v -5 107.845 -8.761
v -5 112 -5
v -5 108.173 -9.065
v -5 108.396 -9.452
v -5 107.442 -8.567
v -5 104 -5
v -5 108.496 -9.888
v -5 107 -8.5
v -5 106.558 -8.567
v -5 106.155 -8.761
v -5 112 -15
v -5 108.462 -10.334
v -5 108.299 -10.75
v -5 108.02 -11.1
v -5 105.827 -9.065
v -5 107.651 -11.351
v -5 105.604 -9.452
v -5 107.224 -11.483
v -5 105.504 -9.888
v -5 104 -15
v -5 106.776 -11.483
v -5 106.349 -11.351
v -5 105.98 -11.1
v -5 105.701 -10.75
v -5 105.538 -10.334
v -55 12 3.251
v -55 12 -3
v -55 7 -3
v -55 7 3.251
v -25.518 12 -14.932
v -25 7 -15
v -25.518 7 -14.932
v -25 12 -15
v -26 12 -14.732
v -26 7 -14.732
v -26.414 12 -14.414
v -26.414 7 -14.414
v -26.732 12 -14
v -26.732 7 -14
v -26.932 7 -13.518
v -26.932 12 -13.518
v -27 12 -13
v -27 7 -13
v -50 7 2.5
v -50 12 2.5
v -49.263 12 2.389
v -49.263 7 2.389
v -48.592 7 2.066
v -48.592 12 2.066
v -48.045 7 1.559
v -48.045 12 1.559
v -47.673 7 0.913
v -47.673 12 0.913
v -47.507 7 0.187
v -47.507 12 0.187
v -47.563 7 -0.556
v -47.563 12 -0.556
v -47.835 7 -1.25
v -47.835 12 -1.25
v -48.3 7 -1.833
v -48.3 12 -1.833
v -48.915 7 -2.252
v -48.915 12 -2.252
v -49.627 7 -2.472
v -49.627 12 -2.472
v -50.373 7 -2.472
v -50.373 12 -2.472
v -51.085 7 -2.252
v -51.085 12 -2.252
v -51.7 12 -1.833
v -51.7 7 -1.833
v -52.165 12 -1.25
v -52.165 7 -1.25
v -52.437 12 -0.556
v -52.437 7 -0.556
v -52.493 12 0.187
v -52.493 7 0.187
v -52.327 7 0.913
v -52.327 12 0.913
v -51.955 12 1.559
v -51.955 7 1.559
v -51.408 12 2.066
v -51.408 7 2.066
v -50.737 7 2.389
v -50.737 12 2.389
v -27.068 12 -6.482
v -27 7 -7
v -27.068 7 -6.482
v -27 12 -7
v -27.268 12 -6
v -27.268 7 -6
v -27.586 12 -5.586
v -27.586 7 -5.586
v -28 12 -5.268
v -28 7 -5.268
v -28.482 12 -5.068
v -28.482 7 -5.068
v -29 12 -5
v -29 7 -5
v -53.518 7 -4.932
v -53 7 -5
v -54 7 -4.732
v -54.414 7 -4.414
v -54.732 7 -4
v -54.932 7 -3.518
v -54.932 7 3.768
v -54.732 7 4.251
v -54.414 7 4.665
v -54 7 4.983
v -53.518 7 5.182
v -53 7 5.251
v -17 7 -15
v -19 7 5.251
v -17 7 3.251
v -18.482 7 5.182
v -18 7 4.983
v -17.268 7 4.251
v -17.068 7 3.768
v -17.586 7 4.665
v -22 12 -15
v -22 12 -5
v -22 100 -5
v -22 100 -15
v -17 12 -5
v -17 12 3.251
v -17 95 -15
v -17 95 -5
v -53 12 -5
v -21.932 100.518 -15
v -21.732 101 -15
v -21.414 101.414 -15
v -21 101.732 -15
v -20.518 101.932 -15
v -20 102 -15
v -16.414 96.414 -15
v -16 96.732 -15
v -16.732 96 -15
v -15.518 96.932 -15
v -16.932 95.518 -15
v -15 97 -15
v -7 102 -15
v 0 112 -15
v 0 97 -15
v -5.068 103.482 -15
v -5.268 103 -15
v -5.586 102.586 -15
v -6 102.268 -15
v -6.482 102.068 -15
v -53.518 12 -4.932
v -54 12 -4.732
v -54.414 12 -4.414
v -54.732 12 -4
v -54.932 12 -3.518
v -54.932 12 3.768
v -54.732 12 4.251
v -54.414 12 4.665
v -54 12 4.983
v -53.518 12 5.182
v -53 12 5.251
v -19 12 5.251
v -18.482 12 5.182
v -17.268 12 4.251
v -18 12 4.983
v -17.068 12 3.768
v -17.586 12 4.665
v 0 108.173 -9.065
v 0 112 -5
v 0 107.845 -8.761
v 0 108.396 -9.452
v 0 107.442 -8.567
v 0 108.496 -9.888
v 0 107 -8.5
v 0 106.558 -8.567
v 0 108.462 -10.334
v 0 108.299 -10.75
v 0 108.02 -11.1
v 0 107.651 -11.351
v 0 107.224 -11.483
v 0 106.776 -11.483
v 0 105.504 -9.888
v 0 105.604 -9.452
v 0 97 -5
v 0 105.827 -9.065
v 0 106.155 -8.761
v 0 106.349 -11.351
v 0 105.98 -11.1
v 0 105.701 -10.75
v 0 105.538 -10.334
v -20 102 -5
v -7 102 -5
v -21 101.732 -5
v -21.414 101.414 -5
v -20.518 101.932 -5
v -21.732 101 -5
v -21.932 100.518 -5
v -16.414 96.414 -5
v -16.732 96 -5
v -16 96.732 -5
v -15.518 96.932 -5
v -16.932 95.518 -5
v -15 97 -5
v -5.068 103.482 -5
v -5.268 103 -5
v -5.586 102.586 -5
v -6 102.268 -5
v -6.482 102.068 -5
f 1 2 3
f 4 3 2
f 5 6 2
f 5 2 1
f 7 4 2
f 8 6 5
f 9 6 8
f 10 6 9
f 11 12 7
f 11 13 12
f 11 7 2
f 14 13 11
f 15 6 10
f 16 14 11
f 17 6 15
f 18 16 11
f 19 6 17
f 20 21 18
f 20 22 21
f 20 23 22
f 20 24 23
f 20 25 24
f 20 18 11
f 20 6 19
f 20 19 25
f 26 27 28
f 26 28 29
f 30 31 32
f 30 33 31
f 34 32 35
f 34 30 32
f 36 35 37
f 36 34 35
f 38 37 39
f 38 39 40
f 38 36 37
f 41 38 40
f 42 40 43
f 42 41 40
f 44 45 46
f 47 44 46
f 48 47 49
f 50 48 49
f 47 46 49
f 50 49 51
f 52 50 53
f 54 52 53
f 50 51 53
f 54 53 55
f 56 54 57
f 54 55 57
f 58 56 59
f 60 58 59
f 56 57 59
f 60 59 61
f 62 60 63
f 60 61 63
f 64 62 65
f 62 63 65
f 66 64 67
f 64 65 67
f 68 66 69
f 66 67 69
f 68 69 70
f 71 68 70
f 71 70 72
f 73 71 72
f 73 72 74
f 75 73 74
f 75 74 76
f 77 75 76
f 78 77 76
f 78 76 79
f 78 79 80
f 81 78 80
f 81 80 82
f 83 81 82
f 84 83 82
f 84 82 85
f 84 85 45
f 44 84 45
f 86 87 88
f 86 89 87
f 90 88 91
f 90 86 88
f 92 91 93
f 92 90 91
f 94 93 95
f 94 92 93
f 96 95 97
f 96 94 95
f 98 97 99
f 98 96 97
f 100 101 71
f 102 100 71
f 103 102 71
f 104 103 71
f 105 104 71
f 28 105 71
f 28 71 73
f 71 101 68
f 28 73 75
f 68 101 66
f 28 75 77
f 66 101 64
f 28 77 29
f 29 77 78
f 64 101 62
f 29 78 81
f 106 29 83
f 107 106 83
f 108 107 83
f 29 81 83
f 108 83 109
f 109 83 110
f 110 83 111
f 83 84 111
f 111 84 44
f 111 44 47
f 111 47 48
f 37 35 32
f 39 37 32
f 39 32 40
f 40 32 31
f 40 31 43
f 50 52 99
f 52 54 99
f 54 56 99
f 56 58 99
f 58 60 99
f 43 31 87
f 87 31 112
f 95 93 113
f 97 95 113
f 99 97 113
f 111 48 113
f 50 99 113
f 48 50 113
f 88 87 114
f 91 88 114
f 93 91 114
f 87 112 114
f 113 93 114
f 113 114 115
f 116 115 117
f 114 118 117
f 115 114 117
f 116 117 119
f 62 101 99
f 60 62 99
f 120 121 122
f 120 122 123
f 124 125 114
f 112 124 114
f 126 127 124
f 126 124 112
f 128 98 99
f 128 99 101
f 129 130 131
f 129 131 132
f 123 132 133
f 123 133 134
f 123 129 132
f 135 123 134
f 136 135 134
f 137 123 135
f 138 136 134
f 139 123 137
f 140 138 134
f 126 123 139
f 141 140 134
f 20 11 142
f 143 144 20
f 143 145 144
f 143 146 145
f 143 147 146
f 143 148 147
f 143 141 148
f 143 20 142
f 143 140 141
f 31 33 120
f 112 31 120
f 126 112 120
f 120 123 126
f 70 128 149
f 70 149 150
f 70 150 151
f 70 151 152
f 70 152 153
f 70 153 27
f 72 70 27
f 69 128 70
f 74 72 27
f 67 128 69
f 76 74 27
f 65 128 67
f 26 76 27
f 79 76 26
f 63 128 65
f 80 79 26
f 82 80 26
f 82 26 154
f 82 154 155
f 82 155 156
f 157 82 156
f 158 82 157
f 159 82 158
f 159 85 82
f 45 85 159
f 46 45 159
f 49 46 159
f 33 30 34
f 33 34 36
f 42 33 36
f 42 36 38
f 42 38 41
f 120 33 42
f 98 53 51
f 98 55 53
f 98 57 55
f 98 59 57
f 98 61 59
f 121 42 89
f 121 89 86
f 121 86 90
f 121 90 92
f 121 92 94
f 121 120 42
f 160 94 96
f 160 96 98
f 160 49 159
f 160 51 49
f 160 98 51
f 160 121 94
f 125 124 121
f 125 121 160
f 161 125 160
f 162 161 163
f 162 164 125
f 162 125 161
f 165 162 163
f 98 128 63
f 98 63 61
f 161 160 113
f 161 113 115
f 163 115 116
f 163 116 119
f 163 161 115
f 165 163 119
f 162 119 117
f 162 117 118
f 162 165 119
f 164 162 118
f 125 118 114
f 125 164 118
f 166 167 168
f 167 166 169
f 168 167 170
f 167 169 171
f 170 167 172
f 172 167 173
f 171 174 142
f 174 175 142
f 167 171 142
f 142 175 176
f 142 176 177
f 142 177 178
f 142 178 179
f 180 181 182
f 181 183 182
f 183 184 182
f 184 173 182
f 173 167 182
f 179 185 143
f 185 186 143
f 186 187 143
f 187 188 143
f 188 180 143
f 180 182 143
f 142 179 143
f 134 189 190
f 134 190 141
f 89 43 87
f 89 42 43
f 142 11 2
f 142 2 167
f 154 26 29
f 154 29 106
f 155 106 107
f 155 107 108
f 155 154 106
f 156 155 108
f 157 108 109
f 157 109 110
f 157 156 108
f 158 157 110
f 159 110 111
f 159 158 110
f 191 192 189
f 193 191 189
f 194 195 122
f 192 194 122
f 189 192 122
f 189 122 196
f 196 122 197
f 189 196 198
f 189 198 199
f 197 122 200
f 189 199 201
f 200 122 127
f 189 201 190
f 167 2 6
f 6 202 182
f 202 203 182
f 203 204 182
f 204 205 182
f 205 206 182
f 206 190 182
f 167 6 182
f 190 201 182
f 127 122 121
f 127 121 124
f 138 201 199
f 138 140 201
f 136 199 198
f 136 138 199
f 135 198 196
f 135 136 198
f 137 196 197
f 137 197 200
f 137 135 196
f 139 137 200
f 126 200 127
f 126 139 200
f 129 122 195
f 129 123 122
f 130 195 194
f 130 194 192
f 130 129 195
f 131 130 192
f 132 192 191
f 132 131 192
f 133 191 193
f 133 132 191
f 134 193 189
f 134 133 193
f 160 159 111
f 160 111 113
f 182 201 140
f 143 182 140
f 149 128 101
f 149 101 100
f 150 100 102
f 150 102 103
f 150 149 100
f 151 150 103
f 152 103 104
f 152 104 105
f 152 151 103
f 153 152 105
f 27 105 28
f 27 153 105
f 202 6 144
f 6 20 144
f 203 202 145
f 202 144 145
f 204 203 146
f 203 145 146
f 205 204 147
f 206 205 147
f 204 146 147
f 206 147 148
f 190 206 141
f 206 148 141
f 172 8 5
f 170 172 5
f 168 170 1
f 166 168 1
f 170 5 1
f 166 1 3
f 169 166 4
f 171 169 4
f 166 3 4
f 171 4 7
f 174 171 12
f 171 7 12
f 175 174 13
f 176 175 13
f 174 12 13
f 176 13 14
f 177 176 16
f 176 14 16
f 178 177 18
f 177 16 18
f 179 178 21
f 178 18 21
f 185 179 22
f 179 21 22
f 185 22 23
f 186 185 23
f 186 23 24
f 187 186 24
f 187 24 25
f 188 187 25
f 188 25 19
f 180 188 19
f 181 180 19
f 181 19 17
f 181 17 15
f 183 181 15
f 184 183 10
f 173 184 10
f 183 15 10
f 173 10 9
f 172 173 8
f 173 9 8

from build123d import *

# Parameters (mm, degrees)
BOSS_EXTRUDE1_DEPTH    = 7
SKETCH2_W              = 5
SKETCH2_H              = 10
BOSS_EXTRUDE2_DEPTH    = 95
SKETCH15_R             = 3.5
CUT_EXTRUDE3_DEPTH     = 7
CIRPATTERN1_COUNT      = 8
SKETCH18_W             = 10
SKETCH18_H             = 5
BOSS_EXTRUDE3_DEPTH    = 34
BOSS_EXTRUDE4_DEPTH    = 10
FILLET1_R              = 2
FILLET2_R              = 2
LPATTERN2_COUNT        = 10
LPATTERN2_PITCH        = 8
FILLET1_OF_LPATTERN2_R = 2
SKETCH20_R             = 2.5
CUT_EXTRUDE4_DEPTH     = 10
CIRPATTERN2_COUNT      = 4
SKETCH21_W             = 135.948856065
SKETCH21_H             = 109.776083996
CUT_EXTRUDE5_DEPTH     = 61.740758688
BOSS_EXTRUDE5_START    = 5
SKETCH22_R             = 2.5
BOSS_EXTRUDE5_DEPTH    = 5
CUT_EXTRUDE6_START     = -10
CUT_EXTRUDE6_DEPTH     = 10
SKETCH24_W             = 6
SKETCH24_H             = 7
CUT_EXTRUDE7_DEPTH     = 1
SKETCH25_W             = 6
SKETCH25_H             = 7
CUT_EXTRUDE8_DEPTH     = 1
SKETCH26_W             = 10
SKETCH26_H             = 5
BOSS_EXTRUDE6_DEPTH    = 5
SKETCH27_W             = 5
SKETCH27_H             = 10
BOSS_EXTRUDE7_DEPTH    = 10
SKETCH29_R             = 1.5
CUT_EXTRUDE9_DEPTH     = 5
FILLET3_R              = 2


with BuildPart() as part:
    # Sketch1 → Boss-Extrude1 (new body)
    with BuildSketch(Plane(origin=(0, 0, 0), x_dir=(1, 0, 0), z_dir=(0, 1, 0))):
        with BuildLine():
            Line((-8, 56.940758688), (-8, 59.740758688))
            ThreePointArc((-8, 59.740758688), (-7.414213562, 61.154972251), (-6, 61.740758688))
            Line((-6, 61.740758688), (6, 61.740758688))
            ThreePointArc((6, 61.740758688), (7.414213562, 61.154972251), (8, 59.740758688))
            Line((8, 59.740758688), (8, 56.940758688))
            ThreePointArc((8, 56.940758688), (22.004297361, 53.123073119), (34.606342345, 45.920050844))
            Line((34.606342345, 45.920050844), (36.586241332, 47.899949831))
            ThreePointArc((36.586241332, 47.899949831), (38.000454895, 48.485736269), (39.414668457, 47.899949831))
            Line((39.414668457, 47.899949831), (47.899949831, 39.414668457))
            ThreePointArc((47.899949831, 39.414668457), (48.485736269, 38.000454895), (47.899949831, 36.586241332))
            Line((47.899949831, 36.586241332), (45.920050844, 34.606342345))
            ThreePointArc((45.920050844, 34.606342345), (53.123073119, 22.004297361), (56.940758688, 8))
            Line((56.940758688, 8), (59.740758688, 8))
            ThreePointArc((59.740758688, 8), (61.154972251, 7.414213562), (61.740758688, 6))
            Line((61.740758688, 6), (61.740758688, -6))
            ThreePointArc((61.740758688, -6), (61.154972251, -7.414213562), (59.740758688, -8))
            Line((59.740758688, -8), (56.940758688, -8))
            ThreePointArc((56.940758688, -8), (53.123073119, -22.004297361), (45.920050844, -34.606342345))
            Line((45.920050844, -34.606342345), (47.899949831, -36.586241332))
            ThreePointArc((47.899949831, -36.586241332), (48.485736269, -38.000454895), (47.899949831, -39.414668457))
            Line((47.899949831, -39.414668457), (39.414668457, -47.899949831))
            ThreePointArc((39.414668457, -47.899949831), (38.000454895, -48.485736269), (36.586241332, -47.899949831))
            Line((36.586241332, -47.899949831), (34.606342345, -45.920050844))
            ThreePointArc((34.606342345, -45.920050844), (22.004297361, -53.123073119), (8, -56.940758688))
            Line((8, -56.940758688), (8, -59.740758688))
            ThreePointArc((8, -59.740758688), (7.414213562, -61.154972251), (6, -61.740758688))
            Line((6, -61.740758688), (-6, -61.740758688))
            ThreePointArc((-6, -61.740758688), (-7.414213562, -61.154972251), (-8, -59.740758688))
            Line((-8, -59.740758688), (-8, -56.940758688))
            ThreePointArc((-8, -56.940758688), (-22.004297361, -53.123073119), (-34.606342345, -45.920050844))
            Line((-34.606342345, -45.920050844), (-36.586241332, -47.899949831))
            ThreePointArc((-36.586241332, -47.899949831), (-38.000454895, -48.485736269), (-39.414668457, -47.899949831))
            Line((-39.414668457, -47.899949831), (-47.899949831, -39.414668457))
            ThreePointArc((-47.899949831, -39.414668457), (-48.485736269, -38.000454895), (-47.899949831, -36.586241332))
            Line((-47.899949831, -36.586241332), (-45.920050844, -34.606342345))
            ThreePointArc((-45.920050844, -34.606342345), (-53.123073119, -22.004297361), (-56.940758688, -8))
            Line((-56.940758688, -8), (-59.740758688, -8))
            ThreePointArc((-59.740758688, -8), (-61.154972251, -7.414213562), (-61.740758688, -6))
            Line((-61.740758688, -6), (-61.740758688, 6))
            ThreePointArc((-61.740758688, 6), (-61.154972251, 7.414213562), (-59.740758688, 8))
            Line((-59.740758688, 8), (-56.940758688, 8))
            ThreePointArc((-56.940758688, 8), (-53.123073119, 22.004297361), (-45.920050844, 34.606342345))
            Line((-45.920050844, 34.606342345), (-47.899949831, 36.586241332))
            ThreePointArc((-47.899949831, 36.586241332), (-48.485736269, 38.000454895), (-47.899949831, 39.414668457))
            Line((-47.899949831, 39.414668457), (-39.414668457, 47.899949831))
            ThreePointArc((-39.414668457, 47.899949831), (-38.000454895, 48.485736269), (-36.586241332, 47.899949831))
            Line((-36.586241332, 47.899949831), (-34.606342345, 45.920050844))
            ThreePointArc((-34.606342345, 45.920050844), (-22.004297361, 53.123073119), (-8, 56.940758688))
        make_face()
    extrude(amount=BOSS_EXTRUDE1_DEPTH)

    # Sketch2 → Boss-Extrude2 (add)
    with BuildSketch(Plane(origin=(0, 7, 0), x_dir=(1, 0, 0), z_dir=(0, 1, 0))):
        with Locations((19.5, 10)):
            Rectangle(SKETCH2_W, SKETCH2_H)
        with Locations((-19.5, 10)):
            Rectangle(SKETCH2_W, SKETCH2_H)
    extrude(amount=BOSS_EXTRUDE2_DEPTH)

    # Sketch15 → Cut-Extrude3 (cut)
    with BuildSketch(Plane.XZ):
        with Locations(Location((0, 0, 0), (0, 0, 270))):
            Circle(SKETCH15_R)
    extrude(amount=-CUT_EXTRUDE3_DEPTH, mode=Mode.SUBTRACT)

    # Sketch16 → Cut-Loft2 section 0
    with BuildSketch(Plane.XZ):
        with BuildLine():
            Line((-6, 59.8), (6, 59.8))
            Line((6, 59.8), (6, 57.5))
            Line((6, 57.5), (-6, 57.5))
            Line((-6, 57.5), (-6, 59.8))
        make_face()
    # Sketch17 → Cut-Loft2 section 1
    with BuildSketch(Plane(origin=(0, 7, 0), x_dir=(1, 0, 0), z_dir=(0, 1, 0))):
        with BuildLine():
            Line((-6, -57.5), (6, -57.5))
            Line((6, -57.5), (6, -60.5))
            Line((6, -60.5), (-6, -60.5))
            Line((-6, -60.5), (-6, -57.5))
        make_face()
    cut_loft2 = loft(mode=Mode.SUBTRACT)

    # CirPattern1: Cut-Loft2 ×8 about axis
    cirpattern1_axis = Axis((0, 0, 0), (0, 1, 0))
    for i in range(1, CIRPATTERN1_COUNT):
        add(cut_loft2.rotate(cirpattern1_axis, i * 360 / CIRPATTERN1_COUNT), mode=Mode.SUBTRACT)

    # Sketch18 → Boss-Extrude3 (add)
    with BuildSketch(Plane(origin=(-17, 0, 0), x_dir=(0, 0, -1), z_dir=(1, 0, 0))):
        with Locations((10, 99.5)):
            Rectangle(SKETCH18_W, SKETCH18_H)
    extrude(amount=BOSS_EXTRUDE3_DEPTH)

    # Sketch19 → Boss-Extrude4 (add)
    with BuildSketch(Plane(origin=(0, 0, -15), x_dir=(-1, 0, 0), z_dir=(0, 0, -1))):
        with BuildLine():
            Line((-17, 93), (-11.04472309, 92.26878394))
            ThreePointArc((-11.04472309, 92.26878394), (-9.922197884, 91), (-11.04472309, 89.73121606))
            Line((-11.04472309, 89.73121606), (-17, 89))
            Line((-17, 89), (-17, 93))
        make_face()
    boss_extrude4 = extrude(amount=-BOSS_EXTRUDE4_DEPTH)

    # Fillet1
    fillet1_edges = [part.edges().sort_by_distance(p)[0] for p in [
        (17, 89, -10),
        (17, 93, -10),
    ]]
    fillet(fillet1_edges, radius=FILLET1_R)

    # Fillet2
    fillet2_edges = [part.edges().sort_by_distance(p)[0] for p in [
        (22, 102, -10),
        (-22, 102, -10),
        (-17, 97, -10),
        (17, 97, -10),
    ]]
    fillet(fillet2_edges, radius=FILLET2_R)

    # LPattern2: Boss-Extrude4 ×10
    with Locations(*[(0, -i * LPATTERN2_PITCH, 0) for i in range(1, LPATTERN2_COUNT)]):
        add(boss_extrude4)

    # Fillet1 of LPattern2
    fillet1_of_lpattern2_edges = [part.edges().sort_by_distance(p)[0] for p in [
        (17, 81, -10),
        (17, 85, -10),
        (17, 73, -10),
        (17, 77, -10),
        (17, 65, -10),
        (17, 69, -10),
        (17, 57, -10),
        (17, 61, -10),
        (17, 49, -10),
        (17, 53, -10),
        (17, 41, -10),
        (17, 45, -10),
        (17, 33, -10),
        (17, 37, -10),
        (17, 25, -10),
        (17, 29, -10),
        (17, 17, -10),
        (17, 21, -10),
    ]]
    fillet(fillet1_of_lpattern2_edges, radius=FILLET1_OF_LPATTERN2_R)

    # Sketch20 → Cut-Extrude4 (cut)
    with BuildSketch(Plane(origin=(0, 7, 0), x_dir=(1, 0, 0), z_dir=(0, 1, 0))):
        with Locations(Location((0, 50, 0), (0, 0, 270))):
            Circle(SKETCH20_R)
    cut_extrude4 = extrude(amount=-CUT_EXTRUDE4_DEPTH, mode=Mode.SUBTRACT)

    # CirPattern2: Cut-Extrude4 ×4 about axis
    cirpattern2_axis = Axis((0, 0, 0), (0, 1, 0))
    for i in range(1, CIRPATTERN2_COUNT):
        add(cut_extrude4.rotate(cirpattern2_axis, i * 360 / CIRPATTERN2_COUNT), mode=Mode.SUBTRACT)

    # Sketch21 → Cut-Extrude5 (cut)
    with BuildSketch(Plane(origin=(0, 0, 0), x_dir=(0, 0, -1), z_dir=(1, 0, 0))):
        with Locations((-0.523455441, 54.888041998)):
            Rectangle(SKETCH21_W, SKETCH21_H)
    extrude(amount=CUT_EXTRUDE5_DEPTH, mode=Mode.SUBTRACT)

    # Sketch22 → Boss-Extrude5 (add)
    with BuildSketch(Plane(origin=(0, 7, 0), x_dir=(1, 0, 0), z_dir=(0, 1, 0)).offset(BOSS_EXTRUDE5_START)):
        with BuildLine():
            Line((-17, 5), (-53, 5))
            ThreePointArc((-53, 5), (-54.414213562, 4.414213562), (-55, 3))
            Line((-55, 3), (-55, -3.250625366))
            ThreePointArc((-55, -3.250625366), (-54.414213562, -4.664838928), (-53, -5.250625366))
            Line((-53, -5.250625366), (-19, -5.250625366))
            ThreePointArc((-19, -5.250625366), (-17.585786438, -4.664838928), (-17, -3.250625366))
            Line((-17, -3.250625366), (-17, 5))
        make_face()
        with Locations(Location((-50, 0, 0), (0, 0, 270))):
            Circle(SKETCH22_R, mode=Mode.SUBTRACT)
    extrude(amount=-BOSS_EXTRUDE5_DEPTH)

    # Sketch23 → Cut-Extrude6 (cut)
    with BuildSketch(Plane(origin=(0, 7, 0), x_dir=(1, 0, 0), z_dir=(0, 1, 0)).offset(CUT_EXTRUDE6_START)):
        with BuildLine():
            Line((0, 60.5), (0, 61.740758688))
            Line((0, 61.740758688), (-6, 61.740758688))
            ThreePointArc((-6, 61.740758688), (-7.414213562, 61.154972251), (-8, 59.740758688))
            Line((-8, 59.740758688), (-8, 56.940758688))
            ThreePointArc((-8, 56.940758688), (-22.004297361, 53.123073119), (-34.606342345, 45.920050844))
            Line((-34.606342345, 45.920050844), (-36.586241332, 47.899949831))
            ThreePointArc((-36.586241332, 47.899949831), (-38.000454895, 48.485736269), (-39.414668457, 47.899949831))
            Line((-39.414668457, 47.899949831), (-47.899949831, 39.414668457))
            ThreePointArc((-47.899949831, 39.414668457), (-48.485736269, 38.000454895), (-47.899949831, 36.586241332))
            Line((-47.899949831, 36.586241332), (-45.920050844, 34.606342345))
            ThreePointArc((-45.920050844, 34.606342345), (-53.123073119, 22.004297361), (-56.940758688, 8))
            Line((-56.940758688, 8), (-59.740758688, 8))
            ThreePointArc((-59.740758688, 8), (-61.154972251, 7.414213562), (-61.740758688, 6))
            Line((-61.740758688, 6), (-61.740758688, -6))
            ThreePointArc((-61.740758688, -6), (-61.154972251, -7.414213562), (-59.740758688, -8))
            Line((-59.740758688, -8), (-56.940758688, -8))
            ThreePointArc((-56.940758688, -8), (-53.123073119, -22.004297361), (-45.920050844, -34.606342345))
            Line((-45.920050844, -34.606342345), (-47.899949831, -36.586241332))
            ThreePointArc((-47.899949831, -36.586241332), (-48.485736269, -38.000454895), (-47.899949831, -39.414668457))
            Line((-47.899949831, -39.414668457), (-39.414668457, -47.899949831))
            ThreePointArc((-39.414668457, -47.899949831), (-38.000454895, -48.485736269), (-36.586241332, -47.899949831))
            Line((-36.586241332, -47.899949831), (-34.606342345, -45.920050844))
            ThreePointArc((-34.606342345, -45.920050844), (-22.004297361, -53.123073119), (-8, -56.940758688))
            Line((-8, -56.940758688), (-8, -59.740758688))
            ThreePointArc((-8, -59.740758688), (-7.414213562, -61.154972251), (-6, -61.740758688))
            Line((-6, -61.740758688), (0, -61.740758688))
            Line((0, -61.740758688), (0, -60.5))
            Line((0, -60.5), (-6, -60.5))
            Line((-6, -60.5), (-6, -57.5))
            Line((-6, -57.5), (0, -57.5))
            Line((0, -57.5), (0, -52.5))
            ThreePointArc((0, -52.5), (-2.5, -50), (0, -47.5))
            Line((0, -47.5), (0, -3.5))
            ThreePointArc((0, -3.5), (-3.5, 0), (0, 3.5))
            Line((0, 3.5), (0, 47.5))
            ThreePointArc((0, 47.5), (-2.5, 50), (0, 52.5))
            Line((0, 52.5), (0, 57.5))
            Line((0, 57.5), (-6, 57.5))
            Line((-6, 57.5), (-6, 60.5))
            Line((-6, 60.5), (0, 60.5))
        make_face()
    extrude(amount=CUT_EXTRUDE6_DEPTH, mode=Mode.SUBTRACT)


with BuildPart() as cut_extrude6_piece_1:
    # of the separate pieces the step leaves, piece 1, a body of its own (cut_extrude6_pieces)
    add(part.part.solids().sort_by_distance((0, 102, -5))[0])

    # Sketch26 → Boss-Extrude6 (add)
    with BuildSketch(Plane.ZY.offset(22)):
        with Locations((-10, 9.5)):
            Rectangle(SKETCH26_W, SKETCH26_H)
    extrude(amount=BOSS_EXTRUDE6_DEPTH)

    # Sketch27 → Boss-Extrude7 (add)
    with BuildSketch(Plane(origin=(0, 102, 0), x_dir=(1, 0, 0), z_dir=(0, 1, 0))):
        with Locations((-2.5, 10)):
            Rectangle(SKETCH27_W, SKETCH27_H)
    extrude(amount=BOSS_EXTRUDE7_DEPTH)

    # Sketch29 → Cut-Extrude9 (cut)
    with BuildSketch(Plane.ZY.offset(5)):
        with Locations((-10, 107)):
            Circle(SKETCH29_R)
    extrude(amount=-CUT_EXTRUDE9_DEPTH, mode=Mode.SUBTRACT)

    # Fillet3
    fillet3_edges = [cut_extrude6_piece_1.edges().sort_by_distance(p)[0] for p in [
        (-27, 9.5, -5),
        (-27, 9.5, -15),
        (-5, 102, -10),
    ]]
    fillet(fillet3_edges, radius=FILLET3_R)


with BuildPart() as cut_extrude6_piece_2:
    # of the separate pieces the step leaves, piece 2, a body of its own (cut_extrude6_pieces)
    add(part.part.solids().sort_by_distance((-6, 0, 59.8))[0])

    # Sketch24 → Cut-Extrude7 (cut)
    with BuildSketch(Plane.XY.offset(60.5)):
        with Locations((-3, 3.5)):
            Rectangle(SKETCH24_W, SKETCH24_H)
    extrude(amount=-CUT_EXTRUDE7_DEPTH, mode=Mode.SUBTRACT)


with BuildPart() as cut_extrude6_piece_3:
    # of the separate pieces the step leaves, piece 3, a body of its own (cut_extrude6_pieces)
    add(part.part.solids().sort_by_distance((0, 7, -60.5))[0])

    # Sketch25 → Cut-Extrude8 (cut)
    with BuildSketch(Plane(origin=(0, 0, -60.5), x_dir=(-1, 0, 0), z_dir=(0, 0, -1))):
        with Locations((3, 3.5)):
            Rectangle(SKETCH25_W, SKETCH25_H)
    extrude(amount=-CUT_EXTRUDE8_DEPTH, mode=Mode.SUBTRACT)


solid = cut_extrude6_piece_1.part
